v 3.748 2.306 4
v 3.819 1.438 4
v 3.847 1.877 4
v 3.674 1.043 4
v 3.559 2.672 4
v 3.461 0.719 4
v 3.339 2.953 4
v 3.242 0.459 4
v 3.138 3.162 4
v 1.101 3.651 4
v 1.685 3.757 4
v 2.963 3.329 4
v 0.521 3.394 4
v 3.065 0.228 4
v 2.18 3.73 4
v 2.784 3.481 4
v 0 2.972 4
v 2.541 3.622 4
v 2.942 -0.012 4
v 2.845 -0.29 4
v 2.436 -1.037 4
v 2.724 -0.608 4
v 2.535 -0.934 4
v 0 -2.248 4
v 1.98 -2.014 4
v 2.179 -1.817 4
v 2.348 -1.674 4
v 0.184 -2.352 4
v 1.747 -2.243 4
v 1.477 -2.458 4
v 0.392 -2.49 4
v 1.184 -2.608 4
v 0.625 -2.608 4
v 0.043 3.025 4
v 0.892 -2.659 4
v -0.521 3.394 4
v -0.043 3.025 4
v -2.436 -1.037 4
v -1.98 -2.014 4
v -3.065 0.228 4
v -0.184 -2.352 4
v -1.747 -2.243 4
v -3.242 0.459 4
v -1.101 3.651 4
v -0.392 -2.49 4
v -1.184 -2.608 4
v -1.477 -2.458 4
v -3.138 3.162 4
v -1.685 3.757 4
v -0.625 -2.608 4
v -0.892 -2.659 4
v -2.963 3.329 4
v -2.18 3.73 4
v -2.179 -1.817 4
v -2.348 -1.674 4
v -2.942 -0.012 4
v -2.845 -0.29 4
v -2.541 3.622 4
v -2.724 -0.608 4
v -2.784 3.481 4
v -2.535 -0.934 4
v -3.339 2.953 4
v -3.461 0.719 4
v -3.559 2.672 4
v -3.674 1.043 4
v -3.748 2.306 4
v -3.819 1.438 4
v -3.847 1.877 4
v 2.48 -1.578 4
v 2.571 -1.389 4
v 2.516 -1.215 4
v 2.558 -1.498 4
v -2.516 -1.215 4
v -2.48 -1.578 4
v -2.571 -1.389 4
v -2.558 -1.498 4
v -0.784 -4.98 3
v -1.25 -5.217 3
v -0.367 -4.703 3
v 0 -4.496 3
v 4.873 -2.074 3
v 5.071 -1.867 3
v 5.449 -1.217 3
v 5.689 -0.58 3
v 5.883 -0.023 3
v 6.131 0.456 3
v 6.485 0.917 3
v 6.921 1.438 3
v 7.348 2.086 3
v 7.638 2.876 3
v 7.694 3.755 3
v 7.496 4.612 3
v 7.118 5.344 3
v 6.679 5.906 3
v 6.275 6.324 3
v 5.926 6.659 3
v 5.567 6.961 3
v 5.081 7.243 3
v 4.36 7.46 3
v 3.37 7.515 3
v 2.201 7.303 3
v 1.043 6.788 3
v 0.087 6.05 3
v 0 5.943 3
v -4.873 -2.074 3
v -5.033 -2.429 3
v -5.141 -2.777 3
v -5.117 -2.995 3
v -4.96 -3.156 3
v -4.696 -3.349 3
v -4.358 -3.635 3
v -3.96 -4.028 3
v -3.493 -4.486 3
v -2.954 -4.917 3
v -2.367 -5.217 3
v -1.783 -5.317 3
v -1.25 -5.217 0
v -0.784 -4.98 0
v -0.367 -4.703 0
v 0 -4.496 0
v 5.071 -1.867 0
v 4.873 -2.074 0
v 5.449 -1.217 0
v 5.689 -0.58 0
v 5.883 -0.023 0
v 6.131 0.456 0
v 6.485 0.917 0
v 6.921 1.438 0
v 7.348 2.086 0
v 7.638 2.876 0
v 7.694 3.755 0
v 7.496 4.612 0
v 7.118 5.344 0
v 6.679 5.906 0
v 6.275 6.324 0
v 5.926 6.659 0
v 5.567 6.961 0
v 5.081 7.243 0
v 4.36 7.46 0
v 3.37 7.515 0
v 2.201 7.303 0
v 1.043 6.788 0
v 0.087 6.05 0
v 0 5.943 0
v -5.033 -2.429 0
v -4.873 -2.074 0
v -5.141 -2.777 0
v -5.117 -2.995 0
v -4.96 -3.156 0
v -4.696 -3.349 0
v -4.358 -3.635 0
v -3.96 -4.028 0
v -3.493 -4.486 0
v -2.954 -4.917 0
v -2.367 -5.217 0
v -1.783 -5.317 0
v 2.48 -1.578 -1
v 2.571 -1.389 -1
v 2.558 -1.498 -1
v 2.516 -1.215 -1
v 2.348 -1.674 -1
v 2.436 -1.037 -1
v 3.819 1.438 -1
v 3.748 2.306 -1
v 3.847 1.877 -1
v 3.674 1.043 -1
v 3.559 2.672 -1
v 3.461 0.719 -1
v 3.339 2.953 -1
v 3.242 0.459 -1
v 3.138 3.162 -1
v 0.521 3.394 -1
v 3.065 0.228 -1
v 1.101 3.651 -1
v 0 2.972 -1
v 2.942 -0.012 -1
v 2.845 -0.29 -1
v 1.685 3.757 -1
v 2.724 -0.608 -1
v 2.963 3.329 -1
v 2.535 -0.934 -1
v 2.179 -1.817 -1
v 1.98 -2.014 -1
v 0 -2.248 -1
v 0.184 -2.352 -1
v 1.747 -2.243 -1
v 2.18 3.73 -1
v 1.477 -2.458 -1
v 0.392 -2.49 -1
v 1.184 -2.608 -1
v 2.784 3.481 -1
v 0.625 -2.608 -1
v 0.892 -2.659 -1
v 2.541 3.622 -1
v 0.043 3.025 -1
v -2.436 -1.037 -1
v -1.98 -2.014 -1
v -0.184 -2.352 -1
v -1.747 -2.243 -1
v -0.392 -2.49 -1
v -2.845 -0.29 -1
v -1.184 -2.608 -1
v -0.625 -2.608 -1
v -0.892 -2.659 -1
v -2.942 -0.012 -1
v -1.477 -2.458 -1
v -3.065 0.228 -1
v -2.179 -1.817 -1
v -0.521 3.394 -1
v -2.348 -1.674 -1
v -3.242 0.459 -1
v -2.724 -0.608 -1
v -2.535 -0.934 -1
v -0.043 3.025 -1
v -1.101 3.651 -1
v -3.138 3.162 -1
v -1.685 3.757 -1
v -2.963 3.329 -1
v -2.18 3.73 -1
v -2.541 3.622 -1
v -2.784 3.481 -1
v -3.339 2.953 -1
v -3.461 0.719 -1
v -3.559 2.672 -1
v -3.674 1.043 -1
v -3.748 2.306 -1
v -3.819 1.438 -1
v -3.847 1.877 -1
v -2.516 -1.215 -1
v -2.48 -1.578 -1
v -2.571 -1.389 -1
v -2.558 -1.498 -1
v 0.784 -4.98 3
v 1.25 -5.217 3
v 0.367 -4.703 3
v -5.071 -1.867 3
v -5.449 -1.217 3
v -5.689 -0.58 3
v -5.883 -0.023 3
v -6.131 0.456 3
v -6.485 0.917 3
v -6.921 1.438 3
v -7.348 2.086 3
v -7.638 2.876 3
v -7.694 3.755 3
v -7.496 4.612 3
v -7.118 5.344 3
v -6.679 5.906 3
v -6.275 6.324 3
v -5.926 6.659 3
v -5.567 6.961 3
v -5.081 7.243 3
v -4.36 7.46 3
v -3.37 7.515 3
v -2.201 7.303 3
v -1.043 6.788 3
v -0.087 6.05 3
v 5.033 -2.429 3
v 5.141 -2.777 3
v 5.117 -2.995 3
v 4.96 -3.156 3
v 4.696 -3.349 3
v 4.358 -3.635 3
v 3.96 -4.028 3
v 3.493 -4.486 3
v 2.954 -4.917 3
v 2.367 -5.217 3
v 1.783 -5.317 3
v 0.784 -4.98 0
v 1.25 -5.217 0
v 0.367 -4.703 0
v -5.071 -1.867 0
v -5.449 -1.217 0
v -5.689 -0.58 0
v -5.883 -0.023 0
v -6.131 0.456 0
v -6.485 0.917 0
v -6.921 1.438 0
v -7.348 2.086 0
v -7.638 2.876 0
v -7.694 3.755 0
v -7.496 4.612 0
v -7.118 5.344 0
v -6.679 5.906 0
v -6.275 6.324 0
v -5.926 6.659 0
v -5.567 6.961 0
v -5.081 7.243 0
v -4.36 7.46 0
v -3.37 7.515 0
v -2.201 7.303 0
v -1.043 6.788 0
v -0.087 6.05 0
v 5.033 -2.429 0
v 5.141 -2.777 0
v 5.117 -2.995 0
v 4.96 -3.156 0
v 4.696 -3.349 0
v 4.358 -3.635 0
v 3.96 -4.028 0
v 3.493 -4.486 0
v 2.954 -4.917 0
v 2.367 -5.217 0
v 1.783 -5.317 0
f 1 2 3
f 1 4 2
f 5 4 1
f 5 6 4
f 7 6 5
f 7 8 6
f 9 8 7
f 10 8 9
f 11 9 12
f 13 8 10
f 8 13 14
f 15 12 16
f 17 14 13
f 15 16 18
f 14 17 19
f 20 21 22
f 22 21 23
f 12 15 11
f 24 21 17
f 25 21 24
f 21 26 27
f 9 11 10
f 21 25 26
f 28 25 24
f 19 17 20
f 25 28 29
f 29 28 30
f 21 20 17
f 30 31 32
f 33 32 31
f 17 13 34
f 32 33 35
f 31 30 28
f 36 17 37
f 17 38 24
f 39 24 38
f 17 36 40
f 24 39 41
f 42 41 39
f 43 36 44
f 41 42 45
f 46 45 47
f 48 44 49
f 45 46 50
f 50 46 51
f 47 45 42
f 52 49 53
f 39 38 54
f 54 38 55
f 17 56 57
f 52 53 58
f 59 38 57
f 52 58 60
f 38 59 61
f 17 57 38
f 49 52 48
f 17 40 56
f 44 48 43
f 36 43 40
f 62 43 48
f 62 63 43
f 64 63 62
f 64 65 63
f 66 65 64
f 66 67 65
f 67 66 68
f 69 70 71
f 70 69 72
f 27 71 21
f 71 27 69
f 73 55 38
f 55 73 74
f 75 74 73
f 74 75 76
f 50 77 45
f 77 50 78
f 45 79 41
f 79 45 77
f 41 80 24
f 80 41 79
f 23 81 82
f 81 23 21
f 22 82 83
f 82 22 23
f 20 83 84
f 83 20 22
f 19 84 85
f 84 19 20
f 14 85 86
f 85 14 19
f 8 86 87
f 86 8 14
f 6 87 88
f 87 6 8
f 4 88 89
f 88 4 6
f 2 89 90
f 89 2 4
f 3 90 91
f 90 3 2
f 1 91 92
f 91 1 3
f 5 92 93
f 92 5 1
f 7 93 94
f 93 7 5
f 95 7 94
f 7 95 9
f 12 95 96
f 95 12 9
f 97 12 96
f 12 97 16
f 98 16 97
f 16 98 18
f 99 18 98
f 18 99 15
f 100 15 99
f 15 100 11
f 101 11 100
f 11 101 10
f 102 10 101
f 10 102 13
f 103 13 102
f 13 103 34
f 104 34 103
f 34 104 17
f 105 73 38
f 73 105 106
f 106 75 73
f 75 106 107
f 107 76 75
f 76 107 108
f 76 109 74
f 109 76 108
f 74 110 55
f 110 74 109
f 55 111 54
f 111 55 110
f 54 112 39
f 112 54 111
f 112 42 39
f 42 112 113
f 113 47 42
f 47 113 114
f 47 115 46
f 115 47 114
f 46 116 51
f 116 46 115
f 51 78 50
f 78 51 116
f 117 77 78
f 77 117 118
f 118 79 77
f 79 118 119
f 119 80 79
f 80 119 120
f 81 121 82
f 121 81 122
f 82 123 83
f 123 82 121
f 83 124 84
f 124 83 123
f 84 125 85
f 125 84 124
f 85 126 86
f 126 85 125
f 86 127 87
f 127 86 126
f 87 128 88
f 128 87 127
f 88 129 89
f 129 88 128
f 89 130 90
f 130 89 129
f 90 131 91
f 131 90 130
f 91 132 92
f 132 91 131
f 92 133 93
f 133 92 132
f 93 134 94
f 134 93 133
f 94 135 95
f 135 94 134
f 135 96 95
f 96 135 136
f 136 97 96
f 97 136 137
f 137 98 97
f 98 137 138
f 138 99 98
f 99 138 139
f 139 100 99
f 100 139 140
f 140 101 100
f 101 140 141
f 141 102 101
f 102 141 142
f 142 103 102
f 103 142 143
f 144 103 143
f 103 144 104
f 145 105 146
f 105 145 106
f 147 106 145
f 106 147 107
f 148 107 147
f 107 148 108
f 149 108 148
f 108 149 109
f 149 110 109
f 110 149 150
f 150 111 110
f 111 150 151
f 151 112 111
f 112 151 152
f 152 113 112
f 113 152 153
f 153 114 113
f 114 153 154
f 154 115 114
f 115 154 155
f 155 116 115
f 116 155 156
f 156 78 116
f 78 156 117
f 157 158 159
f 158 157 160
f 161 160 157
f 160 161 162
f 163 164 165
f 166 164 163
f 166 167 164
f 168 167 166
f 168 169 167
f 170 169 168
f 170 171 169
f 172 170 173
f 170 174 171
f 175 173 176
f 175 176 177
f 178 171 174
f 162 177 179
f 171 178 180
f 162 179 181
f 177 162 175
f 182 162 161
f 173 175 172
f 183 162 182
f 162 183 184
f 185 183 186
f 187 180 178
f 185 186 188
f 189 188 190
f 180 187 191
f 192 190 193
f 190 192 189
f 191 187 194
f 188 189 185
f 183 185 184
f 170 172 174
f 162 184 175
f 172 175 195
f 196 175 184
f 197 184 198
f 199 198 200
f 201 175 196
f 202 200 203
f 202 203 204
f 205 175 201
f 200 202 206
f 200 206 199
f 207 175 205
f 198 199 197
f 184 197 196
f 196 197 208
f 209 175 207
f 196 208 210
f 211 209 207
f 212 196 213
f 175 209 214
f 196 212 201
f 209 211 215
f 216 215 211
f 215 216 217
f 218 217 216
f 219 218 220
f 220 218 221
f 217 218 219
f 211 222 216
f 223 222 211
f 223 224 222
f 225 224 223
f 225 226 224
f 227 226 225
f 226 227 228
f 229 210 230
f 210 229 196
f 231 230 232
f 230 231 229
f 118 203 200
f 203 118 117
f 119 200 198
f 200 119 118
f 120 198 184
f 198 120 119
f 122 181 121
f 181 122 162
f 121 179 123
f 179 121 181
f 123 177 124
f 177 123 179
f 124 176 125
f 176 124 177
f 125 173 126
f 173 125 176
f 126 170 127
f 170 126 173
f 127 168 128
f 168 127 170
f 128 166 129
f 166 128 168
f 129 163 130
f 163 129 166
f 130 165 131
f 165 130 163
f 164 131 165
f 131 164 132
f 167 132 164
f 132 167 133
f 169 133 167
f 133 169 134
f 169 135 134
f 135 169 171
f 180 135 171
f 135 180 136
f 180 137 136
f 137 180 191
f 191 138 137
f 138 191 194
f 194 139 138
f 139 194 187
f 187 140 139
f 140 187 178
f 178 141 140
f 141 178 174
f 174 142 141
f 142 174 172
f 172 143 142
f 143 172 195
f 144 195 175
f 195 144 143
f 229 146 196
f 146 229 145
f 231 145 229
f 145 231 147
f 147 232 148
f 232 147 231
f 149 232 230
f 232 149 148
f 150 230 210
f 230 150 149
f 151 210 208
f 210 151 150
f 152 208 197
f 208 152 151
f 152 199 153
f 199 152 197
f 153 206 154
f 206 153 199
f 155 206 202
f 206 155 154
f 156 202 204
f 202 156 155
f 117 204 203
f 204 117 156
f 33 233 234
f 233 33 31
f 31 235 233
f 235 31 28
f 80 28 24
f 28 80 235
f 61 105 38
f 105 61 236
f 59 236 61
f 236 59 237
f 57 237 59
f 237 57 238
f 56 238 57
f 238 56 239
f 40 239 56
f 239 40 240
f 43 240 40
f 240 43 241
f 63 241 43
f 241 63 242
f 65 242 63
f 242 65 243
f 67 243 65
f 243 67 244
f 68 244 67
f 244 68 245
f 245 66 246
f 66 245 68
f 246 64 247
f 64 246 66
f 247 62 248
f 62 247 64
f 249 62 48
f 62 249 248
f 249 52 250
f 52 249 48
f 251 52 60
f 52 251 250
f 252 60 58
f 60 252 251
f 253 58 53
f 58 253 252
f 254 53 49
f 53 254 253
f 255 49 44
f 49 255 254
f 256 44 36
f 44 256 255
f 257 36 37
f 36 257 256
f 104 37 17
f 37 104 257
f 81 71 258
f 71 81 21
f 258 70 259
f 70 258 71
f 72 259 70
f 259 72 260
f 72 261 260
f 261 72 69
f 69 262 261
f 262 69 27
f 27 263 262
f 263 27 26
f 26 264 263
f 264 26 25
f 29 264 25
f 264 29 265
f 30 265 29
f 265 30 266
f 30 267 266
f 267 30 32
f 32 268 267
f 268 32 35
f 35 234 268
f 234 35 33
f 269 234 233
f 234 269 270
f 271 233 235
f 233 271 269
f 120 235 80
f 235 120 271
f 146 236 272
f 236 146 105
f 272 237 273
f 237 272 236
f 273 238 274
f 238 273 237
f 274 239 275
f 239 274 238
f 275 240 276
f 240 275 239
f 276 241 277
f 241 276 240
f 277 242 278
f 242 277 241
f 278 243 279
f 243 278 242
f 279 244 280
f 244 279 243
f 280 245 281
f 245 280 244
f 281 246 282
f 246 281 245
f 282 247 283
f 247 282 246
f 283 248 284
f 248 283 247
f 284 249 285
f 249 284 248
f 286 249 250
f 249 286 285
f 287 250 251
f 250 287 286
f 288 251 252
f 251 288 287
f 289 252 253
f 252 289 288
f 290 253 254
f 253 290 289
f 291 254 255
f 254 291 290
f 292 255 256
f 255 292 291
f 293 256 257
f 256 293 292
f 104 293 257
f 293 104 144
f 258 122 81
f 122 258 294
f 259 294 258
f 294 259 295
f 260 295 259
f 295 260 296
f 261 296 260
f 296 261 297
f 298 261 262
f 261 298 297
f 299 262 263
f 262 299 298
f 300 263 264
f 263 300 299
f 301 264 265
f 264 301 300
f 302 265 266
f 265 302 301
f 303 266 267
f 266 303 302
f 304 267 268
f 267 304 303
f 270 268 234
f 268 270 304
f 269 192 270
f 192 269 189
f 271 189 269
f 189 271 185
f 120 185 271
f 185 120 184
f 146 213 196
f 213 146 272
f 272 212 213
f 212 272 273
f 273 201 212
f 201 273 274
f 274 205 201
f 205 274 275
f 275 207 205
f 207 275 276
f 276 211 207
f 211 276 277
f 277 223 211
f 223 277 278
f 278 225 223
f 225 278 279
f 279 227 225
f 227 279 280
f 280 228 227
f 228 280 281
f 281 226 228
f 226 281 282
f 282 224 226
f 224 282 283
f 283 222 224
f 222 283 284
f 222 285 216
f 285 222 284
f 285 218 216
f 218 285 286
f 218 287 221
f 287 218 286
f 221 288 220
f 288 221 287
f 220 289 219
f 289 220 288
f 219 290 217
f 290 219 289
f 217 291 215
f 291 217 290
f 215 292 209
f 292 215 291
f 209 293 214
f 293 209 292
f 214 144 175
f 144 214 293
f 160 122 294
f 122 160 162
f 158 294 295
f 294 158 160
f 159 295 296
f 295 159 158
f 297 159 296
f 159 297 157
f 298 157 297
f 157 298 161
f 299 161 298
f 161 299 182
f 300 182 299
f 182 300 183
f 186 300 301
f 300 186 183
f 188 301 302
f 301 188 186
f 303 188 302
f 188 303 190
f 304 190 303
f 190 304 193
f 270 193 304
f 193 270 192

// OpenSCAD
echo(it());
p=it();scale([1,1,0.2]){
union(){
translate([0,0,15])linear_extrude(5,scale = 0.50) scale([10,10])polygon(points =p);
translate([0,0,0])linear_extrude(15,scale = 1) scale([10,10])polygon(points =p);
translate([0,0,-5])linear_extrude(5,scale = 2) scale([5,5])polygon(points =p);
}
mirror([1,0,0])union(){
translate([0,0,15])linear_extrude(5,scale = 0.50) scale([10,10])polygon(points =p);
translate([0,0,0])linear_extrude(15,scale = 1) scale([10,10])polygon(points =p);
translate([0,0,-5])linear_extrude(5,scale = 2) scale([5,5])polygon(points =p);
}}
function it()=let(
  baser = rnd(0.5, 2),
  phase = rnd(360),
  mag1 = rnd(3) * baser,
  rep1 = round(rnd(0, 8)),
  ophase1 = rnd(360),
  mag2 = rnd(6) * baser,
  rep2 = round(rnd(3, 10)),
  ophase2 = rnd(360),
  phase0 = rnd(360),
  r0 = rnd(0, 1),
  phase1 = rnd(360),
  r1 = rnd(0, 1) / 2,
  phase2 = rnd(360),
  r2 = rnd(0, 1) / 3,
  phase3 = rnd(360),
  r3 = rnd(0, 1) / 4,
  phase8 = rnd(360),
  r8 = rnd(0, 1) / 8,
  rsum = baser + r0 + r1 + r2 + r3 + r8,
  step = 5)
[  for (i = [0: step: 360]) 
    let(  theta = i + sin((i + ophase1) * rep1) * mag1 + sin((i + ophase2) * rep2) * mag2)
       [
        sin(theta + phase) * (baser + sin((i + phase0)) * r0 + sin((i + phase1) * 2) * r1 + sin((i + phase2) * 3) * r2 + sin((i + phase3) * 4) * r3 + sin((i + phase8) * 8) * r8) / rsum,
        cos(theta + phase) * (baser + sin((i + phase0)) * r0 + sin((i + phase1) * 2) * r1 + sin((i + phase2) * 3) * r2 + sin((i + phase3) * 4) * r3 + sin((i + phase8) * 8) * r8) / rsum
      ]];
  


function rndR() = [rands(0, 360, 1)[0], rands(0, 360, 1)[1], rands(0, 360, 1)[0]];

function un(v) = v / max(len3(v), 0.000001) * 1;

function p2n(pa, pb, pc) =
let (u = pa - pb, v = pa - pc) un([u[1] * v[2] - u[2] * v[1], u[2] * v[0] - u[0] * v[2], u[0] * v[1] - u[1] * v[0]]);

function avrg(v) = sumv(v, max(0, len(v) - 1)) / len(v);

function lerp(start, end, bias) = (end * bias + start * (1 - bias));

function len3(v) = len(v) == 2 ? sqrt(pow(v[0], 2) + pow(v[1], 2)) : sqrt(pow(v[0], 2) + pow(v[1], 2) + pow(v[2], 2));

function sumv(v, i, s = 0) = (i == s ? v[i] : v[i] + sumv(v, i - 1, s));

function rnd(a = 0, b = 1) = (rands(min(a, b), max(a, b), 1)[0]);

function rndc() = [rands(0, 1, 1)[0], rands(0, 1, 1)[0], rands(0, 1, 1)[0]];
